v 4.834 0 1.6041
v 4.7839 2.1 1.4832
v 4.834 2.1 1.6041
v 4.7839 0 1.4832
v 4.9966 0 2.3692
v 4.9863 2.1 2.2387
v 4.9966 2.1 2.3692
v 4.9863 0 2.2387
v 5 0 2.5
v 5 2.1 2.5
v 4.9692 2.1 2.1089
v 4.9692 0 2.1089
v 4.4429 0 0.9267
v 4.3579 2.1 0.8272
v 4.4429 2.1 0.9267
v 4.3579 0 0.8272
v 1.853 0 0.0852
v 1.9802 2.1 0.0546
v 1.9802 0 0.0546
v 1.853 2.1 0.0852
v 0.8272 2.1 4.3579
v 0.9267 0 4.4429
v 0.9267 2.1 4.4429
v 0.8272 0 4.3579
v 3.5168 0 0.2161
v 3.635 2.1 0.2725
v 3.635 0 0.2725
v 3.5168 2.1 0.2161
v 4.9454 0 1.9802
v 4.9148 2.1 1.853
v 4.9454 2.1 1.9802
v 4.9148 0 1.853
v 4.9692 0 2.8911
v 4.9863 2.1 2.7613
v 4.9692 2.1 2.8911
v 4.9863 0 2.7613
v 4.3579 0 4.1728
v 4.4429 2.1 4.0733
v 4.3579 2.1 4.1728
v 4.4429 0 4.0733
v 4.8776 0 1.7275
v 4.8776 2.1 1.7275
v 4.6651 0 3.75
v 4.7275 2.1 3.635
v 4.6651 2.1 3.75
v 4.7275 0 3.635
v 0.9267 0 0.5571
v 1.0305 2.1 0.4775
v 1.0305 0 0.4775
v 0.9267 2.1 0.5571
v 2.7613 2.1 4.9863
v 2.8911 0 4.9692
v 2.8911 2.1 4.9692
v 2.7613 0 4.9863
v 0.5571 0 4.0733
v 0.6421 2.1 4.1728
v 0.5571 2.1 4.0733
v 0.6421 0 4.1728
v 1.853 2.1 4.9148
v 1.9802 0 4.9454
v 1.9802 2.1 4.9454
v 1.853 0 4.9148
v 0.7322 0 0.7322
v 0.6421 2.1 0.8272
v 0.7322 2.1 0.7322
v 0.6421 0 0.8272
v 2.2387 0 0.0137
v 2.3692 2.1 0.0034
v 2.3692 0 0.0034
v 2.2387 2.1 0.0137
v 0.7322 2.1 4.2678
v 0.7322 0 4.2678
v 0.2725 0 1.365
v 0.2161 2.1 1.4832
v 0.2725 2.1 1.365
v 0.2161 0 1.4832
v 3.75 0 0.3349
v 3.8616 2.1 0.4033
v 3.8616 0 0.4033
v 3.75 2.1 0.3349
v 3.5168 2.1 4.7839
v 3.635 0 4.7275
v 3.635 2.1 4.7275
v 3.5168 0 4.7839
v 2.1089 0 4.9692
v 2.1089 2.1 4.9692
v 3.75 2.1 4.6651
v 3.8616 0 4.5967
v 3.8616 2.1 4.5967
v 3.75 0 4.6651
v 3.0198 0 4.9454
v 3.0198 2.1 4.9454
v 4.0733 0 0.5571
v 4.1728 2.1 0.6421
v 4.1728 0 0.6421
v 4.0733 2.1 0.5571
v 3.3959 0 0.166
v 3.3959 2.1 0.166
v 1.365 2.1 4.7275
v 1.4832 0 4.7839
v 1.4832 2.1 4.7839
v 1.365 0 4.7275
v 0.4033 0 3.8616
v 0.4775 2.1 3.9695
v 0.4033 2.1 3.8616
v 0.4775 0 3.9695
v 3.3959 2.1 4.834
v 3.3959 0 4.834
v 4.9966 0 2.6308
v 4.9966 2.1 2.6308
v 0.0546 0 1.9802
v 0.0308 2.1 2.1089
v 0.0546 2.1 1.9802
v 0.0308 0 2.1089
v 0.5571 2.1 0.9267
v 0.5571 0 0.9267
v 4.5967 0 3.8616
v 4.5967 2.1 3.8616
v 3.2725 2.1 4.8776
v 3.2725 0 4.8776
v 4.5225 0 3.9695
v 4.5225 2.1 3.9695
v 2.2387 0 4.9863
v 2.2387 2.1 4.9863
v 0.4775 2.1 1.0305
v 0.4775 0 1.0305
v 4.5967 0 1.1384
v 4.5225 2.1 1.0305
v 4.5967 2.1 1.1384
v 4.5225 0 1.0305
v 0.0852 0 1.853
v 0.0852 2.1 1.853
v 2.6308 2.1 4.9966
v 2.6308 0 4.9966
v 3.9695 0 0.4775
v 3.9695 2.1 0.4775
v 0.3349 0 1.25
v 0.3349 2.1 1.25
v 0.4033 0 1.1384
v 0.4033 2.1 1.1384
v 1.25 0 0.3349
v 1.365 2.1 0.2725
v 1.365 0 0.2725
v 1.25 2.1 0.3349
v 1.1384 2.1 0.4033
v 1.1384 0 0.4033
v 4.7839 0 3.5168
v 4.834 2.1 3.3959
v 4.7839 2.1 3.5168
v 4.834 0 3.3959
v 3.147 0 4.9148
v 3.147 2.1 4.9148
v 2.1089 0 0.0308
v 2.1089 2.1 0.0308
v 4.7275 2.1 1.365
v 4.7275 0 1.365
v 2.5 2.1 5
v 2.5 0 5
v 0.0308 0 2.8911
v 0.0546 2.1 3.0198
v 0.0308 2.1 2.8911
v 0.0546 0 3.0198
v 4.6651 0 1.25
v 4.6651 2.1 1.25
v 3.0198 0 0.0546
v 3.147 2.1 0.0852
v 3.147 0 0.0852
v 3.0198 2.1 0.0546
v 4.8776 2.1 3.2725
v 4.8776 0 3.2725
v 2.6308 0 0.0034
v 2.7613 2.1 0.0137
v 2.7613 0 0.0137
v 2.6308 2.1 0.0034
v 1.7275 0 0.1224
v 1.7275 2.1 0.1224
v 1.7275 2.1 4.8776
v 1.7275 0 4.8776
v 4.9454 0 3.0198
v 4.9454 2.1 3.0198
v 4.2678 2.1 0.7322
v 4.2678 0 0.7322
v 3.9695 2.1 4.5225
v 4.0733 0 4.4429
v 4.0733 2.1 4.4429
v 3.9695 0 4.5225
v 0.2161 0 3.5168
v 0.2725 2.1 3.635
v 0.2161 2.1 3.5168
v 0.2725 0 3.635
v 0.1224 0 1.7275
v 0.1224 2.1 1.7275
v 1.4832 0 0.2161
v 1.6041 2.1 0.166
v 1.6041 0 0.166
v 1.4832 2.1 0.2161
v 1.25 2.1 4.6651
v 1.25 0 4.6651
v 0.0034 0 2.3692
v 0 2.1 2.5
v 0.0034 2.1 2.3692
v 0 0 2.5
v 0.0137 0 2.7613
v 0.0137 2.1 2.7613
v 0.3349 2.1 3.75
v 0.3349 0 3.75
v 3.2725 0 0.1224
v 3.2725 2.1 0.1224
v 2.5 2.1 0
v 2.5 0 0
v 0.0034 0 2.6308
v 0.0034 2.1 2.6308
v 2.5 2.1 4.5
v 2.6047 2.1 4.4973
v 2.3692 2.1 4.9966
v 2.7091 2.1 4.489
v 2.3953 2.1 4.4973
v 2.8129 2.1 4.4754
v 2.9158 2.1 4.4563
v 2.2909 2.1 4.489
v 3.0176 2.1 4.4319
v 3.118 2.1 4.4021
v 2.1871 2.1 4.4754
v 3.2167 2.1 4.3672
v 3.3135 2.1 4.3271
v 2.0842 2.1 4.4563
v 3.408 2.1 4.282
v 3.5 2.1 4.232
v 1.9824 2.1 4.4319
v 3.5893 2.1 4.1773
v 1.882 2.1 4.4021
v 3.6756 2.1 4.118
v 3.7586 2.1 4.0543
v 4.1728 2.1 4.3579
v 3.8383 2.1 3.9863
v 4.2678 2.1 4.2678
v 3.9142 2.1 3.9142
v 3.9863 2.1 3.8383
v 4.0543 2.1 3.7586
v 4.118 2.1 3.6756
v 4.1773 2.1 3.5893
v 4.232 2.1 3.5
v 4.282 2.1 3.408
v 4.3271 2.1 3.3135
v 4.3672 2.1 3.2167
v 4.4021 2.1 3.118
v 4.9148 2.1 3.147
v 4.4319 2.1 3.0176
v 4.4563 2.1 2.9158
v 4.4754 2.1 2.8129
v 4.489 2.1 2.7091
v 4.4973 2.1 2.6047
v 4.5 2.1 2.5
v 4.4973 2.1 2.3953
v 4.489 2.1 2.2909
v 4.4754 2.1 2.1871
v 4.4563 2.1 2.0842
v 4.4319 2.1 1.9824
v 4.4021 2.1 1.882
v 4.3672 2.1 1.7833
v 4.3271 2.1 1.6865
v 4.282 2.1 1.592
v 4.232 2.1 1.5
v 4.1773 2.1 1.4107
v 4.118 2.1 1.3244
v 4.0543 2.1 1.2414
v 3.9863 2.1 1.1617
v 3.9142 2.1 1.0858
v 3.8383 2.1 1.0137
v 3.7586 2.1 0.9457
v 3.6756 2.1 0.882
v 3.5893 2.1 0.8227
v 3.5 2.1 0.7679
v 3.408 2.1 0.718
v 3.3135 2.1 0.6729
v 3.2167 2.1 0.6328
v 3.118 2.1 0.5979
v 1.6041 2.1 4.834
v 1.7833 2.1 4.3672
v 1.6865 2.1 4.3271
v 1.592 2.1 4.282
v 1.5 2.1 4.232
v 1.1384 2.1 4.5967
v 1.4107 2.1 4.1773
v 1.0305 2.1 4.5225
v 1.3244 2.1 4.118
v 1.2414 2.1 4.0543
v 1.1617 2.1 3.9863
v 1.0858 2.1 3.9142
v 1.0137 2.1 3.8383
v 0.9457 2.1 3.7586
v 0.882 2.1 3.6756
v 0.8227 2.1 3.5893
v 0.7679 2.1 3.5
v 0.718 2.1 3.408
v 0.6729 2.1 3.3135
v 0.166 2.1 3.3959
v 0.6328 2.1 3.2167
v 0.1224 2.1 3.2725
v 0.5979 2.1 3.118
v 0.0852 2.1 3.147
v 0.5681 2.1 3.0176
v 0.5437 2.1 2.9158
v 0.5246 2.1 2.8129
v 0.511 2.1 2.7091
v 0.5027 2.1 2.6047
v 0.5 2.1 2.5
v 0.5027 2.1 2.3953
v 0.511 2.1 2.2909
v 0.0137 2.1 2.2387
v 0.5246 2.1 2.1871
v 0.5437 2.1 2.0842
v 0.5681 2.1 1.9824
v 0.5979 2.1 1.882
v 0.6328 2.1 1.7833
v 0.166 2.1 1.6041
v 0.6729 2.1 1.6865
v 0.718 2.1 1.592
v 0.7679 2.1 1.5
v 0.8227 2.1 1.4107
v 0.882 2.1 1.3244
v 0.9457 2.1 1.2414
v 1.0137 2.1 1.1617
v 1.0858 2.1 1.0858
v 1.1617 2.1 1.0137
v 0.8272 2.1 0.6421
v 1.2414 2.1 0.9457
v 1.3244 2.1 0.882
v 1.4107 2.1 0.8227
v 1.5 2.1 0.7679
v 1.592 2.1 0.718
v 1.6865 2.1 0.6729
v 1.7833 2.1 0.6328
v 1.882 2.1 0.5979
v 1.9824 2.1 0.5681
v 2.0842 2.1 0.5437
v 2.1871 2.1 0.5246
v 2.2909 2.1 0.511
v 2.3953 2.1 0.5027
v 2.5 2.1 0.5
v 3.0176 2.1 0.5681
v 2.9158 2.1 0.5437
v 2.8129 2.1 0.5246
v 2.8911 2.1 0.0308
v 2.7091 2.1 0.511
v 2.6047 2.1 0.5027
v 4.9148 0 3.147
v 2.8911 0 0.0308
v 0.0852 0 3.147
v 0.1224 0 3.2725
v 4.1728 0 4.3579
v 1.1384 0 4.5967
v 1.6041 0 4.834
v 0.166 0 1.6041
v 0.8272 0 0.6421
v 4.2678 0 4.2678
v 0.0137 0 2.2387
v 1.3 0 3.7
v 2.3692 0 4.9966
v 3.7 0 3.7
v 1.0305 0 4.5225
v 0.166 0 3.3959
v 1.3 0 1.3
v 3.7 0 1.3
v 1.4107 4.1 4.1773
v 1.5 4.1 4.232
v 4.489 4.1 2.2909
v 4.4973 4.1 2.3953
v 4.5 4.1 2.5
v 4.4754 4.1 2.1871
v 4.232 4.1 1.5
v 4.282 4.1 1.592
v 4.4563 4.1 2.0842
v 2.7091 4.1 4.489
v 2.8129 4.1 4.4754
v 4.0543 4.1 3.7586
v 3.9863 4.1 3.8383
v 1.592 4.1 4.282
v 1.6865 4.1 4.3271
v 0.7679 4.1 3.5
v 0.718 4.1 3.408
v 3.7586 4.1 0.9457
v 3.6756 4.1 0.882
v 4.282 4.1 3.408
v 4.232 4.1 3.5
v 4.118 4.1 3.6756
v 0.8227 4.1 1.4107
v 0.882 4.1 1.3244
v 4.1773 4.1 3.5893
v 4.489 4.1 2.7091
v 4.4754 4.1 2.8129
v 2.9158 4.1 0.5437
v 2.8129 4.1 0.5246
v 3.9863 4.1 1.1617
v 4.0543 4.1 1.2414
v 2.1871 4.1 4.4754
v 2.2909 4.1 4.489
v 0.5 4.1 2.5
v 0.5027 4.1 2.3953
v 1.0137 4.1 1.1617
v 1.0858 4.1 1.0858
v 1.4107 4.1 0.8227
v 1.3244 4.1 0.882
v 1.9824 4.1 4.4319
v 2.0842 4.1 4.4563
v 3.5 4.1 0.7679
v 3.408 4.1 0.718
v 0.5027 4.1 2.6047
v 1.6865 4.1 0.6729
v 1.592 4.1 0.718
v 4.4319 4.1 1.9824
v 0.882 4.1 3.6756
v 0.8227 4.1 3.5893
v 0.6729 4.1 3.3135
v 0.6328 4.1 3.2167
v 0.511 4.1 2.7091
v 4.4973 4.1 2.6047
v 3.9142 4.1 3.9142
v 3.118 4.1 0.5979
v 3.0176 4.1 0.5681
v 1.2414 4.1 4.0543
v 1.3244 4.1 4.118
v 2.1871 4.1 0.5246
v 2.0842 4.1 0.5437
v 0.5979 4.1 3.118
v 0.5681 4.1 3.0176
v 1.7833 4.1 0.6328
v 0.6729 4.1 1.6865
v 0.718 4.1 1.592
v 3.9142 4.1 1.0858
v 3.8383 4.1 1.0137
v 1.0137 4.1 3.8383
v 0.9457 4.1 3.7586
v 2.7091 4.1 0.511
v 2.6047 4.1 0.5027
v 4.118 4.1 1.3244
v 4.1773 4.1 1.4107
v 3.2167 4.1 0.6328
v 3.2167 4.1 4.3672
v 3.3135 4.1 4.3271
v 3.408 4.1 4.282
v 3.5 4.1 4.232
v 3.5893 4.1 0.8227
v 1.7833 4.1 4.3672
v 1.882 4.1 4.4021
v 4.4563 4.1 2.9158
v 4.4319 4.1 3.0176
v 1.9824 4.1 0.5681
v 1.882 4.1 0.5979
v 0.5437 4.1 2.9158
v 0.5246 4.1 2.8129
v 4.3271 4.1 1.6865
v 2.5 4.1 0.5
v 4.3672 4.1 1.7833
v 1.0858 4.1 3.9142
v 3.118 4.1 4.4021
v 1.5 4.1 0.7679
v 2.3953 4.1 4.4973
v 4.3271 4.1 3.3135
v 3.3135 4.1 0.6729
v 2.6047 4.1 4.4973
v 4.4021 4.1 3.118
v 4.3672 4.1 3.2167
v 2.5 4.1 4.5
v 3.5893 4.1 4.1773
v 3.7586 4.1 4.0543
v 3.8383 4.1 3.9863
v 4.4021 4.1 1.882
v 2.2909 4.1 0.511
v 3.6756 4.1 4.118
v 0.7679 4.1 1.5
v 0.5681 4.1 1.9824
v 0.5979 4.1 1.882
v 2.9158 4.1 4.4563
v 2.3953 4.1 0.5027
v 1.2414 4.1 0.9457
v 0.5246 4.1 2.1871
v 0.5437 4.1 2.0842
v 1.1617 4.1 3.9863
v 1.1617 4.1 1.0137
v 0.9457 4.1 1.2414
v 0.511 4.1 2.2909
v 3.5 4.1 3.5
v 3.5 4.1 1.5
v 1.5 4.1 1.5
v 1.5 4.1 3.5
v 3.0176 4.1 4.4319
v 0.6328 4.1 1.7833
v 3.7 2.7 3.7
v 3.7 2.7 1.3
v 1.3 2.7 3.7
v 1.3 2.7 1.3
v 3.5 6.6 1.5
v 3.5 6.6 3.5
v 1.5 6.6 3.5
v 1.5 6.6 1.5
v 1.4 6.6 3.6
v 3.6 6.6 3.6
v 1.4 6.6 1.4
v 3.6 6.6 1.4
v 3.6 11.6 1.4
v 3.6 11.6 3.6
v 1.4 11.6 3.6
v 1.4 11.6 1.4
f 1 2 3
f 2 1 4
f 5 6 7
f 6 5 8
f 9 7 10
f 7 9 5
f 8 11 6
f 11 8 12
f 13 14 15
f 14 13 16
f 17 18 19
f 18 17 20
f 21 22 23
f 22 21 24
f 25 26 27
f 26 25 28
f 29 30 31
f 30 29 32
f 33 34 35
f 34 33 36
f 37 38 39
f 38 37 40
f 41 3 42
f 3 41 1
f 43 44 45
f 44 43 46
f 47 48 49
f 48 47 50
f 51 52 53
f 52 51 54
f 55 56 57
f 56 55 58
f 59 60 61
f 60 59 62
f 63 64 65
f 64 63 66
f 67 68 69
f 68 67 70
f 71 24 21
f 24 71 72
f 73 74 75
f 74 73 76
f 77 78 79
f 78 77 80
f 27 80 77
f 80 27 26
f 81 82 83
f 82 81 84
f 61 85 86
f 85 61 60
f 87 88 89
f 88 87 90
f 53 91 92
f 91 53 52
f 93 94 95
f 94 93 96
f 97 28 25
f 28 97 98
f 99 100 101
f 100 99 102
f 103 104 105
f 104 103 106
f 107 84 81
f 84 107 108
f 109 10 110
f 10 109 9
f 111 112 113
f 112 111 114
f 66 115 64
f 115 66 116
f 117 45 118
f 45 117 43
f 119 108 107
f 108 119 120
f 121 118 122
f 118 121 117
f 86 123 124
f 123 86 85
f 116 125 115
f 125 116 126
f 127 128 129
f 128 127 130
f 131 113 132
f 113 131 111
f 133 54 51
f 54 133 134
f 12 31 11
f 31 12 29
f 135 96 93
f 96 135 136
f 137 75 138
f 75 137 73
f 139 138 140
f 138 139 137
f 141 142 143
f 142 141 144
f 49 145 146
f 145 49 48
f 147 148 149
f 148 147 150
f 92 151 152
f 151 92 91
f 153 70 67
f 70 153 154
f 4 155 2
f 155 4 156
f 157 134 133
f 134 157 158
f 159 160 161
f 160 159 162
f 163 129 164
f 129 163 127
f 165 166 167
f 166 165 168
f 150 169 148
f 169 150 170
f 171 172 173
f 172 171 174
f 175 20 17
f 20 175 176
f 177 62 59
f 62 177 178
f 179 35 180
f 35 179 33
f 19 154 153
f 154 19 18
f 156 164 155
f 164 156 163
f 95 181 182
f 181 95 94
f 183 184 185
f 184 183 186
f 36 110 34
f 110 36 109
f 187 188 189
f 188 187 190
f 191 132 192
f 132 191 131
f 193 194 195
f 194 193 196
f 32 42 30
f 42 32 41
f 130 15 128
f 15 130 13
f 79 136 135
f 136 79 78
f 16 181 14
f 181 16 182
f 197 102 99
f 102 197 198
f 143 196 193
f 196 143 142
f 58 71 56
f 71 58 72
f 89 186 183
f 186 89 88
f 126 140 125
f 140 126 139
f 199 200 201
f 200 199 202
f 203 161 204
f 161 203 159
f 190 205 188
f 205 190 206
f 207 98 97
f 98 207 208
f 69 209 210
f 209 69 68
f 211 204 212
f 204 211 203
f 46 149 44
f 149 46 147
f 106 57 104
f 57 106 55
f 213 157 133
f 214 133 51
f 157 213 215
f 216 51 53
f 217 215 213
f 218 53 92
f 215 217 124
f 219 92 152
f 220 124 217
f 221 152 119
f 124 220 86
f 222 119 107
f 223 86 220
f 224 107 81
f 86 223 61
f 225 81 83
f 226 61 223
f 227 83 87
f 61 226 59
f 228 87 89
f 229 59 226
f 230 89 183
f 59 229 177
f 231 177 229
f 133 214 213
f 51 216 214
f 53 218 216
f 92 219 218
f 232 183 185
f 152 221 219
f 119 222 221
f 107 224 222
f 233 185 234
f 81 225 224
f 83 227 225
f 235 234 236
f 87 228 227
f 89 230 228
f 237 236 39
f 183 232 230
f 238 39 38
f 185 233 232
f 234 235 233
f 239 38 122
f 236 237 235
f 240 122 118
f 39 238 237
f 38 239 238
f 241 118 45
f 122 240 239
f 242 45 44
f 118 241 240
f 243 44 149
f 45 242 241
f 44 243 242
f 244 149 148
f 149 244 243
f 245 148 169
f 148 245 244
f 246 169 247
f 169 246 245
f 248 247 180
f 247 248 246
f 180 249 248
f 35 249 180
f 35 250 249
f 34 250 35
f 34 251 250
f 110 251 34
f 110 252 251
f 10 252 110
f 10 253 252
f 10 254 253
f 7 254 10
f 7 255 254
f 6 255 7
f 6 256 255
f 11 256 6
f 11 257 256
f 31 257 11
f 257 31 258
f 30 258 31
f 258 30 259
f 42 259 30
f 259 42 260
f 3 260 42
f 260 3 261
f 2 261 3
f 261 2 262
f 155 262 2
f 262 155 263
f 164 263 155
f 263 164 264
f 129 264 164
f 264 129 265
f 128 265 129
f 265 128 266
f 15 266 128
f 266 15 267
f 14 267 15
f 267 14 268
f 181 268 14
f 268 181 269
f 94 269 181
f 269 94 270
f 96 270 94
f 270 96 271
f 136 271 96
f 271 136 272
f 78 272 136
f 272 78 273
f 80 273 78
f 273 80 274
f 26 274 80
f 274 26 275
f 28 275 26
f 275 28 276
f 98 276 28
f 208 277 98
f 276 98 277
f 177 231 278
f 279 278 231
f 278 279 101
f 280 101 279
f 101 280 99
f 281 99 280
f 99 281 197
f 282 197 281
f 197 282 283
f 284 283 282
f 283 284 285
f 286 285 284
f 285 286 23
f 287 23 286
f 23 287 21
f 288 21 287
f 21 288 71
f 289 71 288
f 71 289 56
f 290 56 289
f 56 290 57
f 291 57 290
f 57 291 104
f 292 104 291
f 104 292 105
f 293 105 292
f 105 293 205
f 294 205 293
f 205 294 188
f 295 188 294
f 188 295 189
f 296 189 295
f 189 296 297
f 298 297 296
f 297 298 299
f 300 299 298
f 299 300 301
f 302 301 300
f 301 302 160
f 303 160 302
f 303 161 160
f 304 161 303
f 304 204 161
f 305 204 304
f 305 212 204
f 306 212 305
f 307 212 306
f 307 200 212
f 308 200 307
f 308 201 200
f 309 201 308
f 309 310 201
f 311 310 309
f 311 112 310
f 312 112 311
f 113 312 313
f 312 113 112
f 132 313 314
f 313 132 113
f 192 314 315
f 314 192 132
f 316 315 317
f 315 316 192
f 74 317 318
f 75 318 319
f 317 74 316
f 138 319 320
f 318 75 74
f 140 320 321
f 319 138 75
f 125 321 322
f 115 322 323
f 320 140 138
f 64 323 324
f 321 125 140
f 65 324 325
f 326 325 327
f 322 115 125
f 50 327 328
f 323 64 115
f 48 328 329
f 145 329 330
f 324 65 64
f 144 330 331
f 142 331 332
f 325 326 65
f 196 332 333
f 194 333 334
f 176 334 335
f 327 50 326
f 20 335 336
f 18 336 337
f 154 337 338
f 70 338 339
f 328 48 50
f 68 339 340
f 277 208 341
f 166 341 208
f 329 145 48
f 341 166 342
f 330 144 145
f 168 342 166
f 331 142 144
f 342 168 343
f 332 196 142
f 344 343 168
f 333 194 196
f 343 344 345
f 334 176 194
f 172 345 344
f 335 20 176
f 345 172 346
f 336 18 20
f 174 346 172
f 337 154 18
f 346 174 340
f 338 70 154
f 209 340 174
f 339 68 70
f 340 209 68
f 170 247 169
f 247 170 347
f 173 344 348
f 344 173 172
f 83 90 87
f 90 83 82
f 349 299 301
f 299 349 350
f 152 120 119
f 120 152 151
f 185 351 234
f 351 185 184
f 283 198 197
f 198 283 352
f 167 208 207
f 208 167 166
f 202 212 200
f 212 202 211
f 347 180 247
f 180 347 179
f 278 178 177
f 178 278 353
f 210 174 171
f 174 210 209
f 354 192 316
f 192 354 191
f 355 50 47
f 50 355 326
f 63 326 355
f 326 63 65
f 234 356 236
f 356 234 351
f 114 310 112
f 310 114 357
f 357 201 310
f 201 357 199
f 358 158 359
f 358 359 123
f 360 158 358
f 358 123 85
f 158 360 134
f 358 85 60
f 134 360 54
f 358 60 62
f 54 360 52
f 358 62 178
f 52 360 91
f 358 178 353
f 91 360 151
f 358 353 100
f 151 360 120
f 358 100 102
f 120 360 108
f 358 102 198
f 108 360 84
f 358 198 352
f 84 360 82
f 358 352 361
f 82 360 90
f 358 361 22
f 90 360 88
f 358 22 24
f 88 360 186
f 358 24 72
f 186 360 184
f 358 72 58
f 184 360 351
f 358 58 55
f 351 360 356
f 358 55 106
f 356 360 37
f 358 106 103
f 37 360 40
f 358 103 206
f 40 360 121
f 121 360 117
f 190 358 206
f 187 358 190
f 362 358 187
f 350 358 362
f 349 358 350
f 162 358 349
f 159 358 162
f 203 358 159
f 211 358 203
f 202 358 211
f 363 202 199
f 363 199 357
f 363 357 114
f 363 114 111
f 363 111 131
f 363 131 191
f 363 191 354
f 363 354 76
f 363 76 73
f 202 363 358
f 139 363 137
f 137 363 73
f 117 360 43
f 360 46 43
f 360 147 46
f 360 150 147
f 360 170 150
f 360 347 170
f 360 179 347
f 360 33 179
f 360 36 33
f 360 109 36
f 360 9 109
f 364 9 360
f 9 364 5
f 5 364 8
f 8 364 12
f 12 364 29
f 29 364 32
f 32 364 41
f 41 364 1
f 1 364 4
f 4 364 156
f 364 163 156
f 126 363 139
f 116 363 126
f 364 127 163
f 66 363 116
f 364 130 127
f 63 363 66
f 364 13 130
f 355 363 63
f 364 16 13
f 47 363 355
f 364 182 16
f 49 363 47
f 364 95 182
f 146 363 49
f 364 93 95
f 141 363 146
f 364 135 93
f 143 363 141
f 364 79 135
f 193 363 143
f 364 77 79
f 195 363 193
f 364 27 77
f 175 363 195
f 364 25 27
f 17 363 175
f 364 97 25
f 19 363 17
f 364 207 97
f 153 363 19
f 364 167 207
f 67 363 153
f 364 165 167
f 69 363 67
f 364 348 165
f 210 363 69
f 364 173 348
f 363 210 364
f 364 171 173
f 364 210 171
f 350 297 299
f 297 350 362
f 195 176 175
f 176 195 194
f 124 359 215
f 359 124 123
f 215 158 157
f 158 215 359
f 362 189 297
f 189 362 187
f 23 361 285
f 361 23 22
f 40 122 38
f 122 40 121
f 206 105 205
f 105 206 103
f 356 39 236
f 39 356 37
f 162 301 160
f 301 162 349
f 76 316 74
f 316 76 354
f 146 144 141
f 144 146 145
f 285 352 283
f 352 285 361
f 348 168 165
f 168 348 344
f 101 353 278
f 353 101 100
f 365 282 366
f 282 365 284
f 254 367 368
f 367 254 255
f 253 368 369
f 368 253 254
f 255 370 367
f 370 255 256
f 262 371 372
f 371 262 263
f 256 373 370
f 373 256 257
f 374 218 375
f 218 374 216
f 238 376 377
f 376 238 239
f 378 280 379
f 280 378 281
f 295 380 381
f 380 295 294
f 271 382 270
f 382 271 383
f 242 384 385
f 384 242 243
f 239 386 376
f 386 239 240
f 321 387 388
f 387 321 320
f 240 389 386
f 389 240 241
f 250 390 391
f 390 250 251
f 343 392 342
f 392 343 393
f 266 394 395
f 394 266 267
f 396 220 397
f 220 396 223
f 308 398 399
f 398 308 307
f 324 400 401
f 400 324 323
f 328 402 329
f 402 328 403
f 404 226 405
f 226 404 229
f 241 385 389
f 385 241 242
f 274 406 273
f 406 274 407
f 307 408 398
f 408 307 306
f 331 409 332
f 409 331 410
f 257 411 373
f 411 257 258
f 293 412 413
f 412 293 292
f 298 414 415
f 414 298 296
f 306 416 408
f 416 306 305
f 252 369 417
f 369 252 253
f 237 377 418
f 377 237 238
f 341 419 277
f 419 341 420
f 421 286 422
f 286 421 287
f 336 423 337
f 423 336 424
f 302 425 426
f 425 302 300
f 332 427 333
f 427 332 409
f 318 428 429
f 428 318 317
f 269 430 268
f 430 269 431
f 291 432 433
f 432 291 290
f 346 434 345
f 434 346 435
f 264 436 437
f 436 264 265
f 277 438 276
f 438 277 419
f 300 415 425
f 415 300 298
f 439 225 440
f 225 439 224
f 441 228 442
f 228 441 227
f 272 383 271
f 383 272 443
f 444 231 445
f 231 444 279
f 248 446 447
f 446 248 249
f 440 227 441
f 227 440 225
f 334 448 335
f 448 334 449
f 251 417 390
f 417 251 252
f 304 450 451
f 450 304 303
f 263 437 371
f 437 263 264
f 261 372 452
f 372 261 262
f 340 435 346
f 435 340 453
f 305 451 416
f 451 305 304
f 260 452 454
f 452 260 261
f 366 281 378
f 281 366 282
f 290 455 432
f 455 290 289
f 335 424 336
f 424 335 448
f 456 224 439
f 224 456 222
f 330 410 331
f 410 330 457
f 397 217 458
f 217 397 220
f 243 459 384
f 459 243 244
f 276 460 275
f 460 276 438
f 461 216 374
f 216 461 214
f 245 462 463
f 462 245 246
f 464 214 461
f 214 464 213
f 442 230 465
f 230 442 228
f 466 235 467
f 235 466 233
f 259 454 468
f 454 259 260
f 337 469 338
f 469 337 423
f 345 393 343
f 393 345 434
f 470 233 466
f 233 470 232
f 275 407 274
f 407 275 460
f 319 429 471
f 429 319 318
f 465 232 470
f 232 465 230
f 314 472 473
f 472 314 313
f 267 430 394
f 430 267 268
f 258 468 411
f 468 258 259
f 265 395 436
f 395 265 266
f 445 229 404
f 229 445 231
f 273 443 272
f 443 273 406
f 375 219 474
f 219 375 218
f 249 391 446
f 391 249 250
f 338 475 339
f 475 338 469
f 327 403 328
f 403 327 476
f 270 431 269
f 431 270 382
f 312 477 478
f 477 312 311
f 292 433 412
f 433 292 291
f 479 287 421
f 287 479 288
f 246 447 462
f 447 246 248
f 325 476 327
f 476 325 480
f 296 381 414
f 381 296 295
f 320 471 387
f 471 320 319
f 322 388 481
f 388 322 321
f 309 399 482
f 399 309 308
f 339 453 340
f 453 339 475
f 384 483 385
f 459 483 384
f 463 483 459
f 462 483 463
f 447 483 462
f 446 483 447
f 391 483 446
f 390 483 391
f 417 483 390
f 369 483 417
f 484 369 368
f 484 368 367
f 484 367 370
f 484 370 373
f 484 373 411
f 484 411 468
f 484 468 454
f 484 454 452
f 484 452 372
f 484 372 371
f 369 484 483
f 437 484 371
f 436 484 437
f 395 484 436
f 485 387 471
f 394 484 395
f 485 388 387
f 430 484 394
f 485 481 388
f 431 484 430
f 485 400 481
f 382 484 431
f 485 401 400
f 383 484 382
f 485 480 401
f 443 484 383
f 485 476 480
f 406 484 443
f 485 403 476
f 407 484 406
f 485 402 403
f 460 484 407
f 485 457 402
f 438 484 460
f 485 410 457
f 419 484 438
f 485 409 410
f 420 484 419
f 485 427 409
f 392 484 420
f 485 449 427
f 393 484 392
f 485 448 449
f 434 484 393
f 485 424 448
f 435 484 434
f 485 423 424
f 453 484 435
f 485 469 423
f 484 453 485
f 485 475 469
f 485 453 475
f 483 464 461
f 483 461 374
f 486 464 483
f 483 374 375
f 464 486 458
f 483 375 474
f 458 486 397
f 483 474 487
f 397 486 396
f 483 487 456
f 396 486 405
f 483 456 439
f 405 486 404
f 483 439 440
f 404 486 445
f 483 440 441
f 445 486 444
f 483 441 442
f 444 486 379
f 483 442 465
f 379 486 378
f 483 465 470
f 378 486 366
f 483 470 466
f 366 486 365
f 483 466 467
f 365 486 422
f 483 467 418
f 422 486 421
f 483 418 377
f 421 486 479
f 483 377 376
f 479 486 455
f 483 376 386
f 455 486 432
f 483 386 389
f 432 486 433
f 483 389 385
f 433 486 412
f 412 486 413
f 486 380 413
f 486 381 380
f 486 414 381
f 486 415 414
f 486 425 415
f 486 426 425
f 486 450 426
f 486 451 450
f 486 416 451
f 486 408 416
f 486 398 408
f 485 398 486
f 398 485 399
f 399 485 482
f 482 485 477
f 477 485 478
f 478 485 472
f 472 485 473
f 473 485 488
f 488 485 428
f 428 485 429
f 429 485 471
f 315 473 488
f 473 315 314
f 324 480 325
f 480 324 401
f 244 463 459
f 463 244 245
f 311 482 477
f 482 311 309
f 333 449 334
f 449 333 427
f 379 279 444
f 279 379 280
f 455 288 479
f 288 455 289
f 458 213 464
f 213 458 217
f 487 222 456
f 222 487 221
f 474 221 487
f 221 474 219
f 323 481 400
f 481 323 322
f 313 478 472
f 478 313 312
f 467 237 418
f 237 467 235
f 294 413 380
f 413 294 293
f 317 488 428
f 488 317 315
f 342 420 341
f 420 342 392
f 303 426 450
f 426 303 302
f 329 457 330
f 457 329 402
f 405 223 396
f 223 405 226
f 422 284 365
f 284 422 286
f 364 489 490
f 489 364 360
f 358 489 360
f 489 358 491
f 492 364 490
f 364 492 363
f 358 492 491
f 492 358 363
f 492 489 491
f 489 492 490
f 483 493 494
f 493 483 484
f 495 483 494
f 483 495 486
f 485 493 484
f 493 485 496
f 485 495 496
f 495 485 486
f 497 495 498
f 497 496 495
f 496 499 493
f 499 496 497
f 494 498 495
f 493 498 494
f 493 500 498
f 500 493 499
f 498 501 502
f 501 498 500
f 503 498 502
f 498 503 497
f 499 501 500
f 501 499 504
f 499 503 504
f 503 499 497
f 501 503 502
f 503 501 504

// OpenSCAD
// file: shared/measurements.scad
/*
 * Keyboard Measurements
 */

pcb_thickness = 1.6;

// The plastic used to cover the TP mount's metal part to make
// sure it doesn't short the switch pins.
tp_isolator_thickness = 0.4;




/*
 * Kailh Choc Switch Measurements
 * http://www.kailh.com/uploads/allimg/171208/2-1G20Q0432C29.png
 */

// The width of the choc switch where it touches the bottom plate
choc_width_bottom = 13.6;

// The width of the choc switch with the notch that sits above the top plate
choc_width_notch = 15.0;

// How much the notch adds in width on each side
// (0.7mm)
choc_notch_width = (choc_width_notch - choc_width_bottom) / 2;

// The space from the pcb until the choc switch notch
choc_notch_to_pcb_z_space = 2.2;

// Total x distance between switch center points (choc x spacing)
choc_spacing_x = 18;

// The space between two switches at the bottom plate
// (4.4mm)
choc_switches_space_between_bottom = choc_spacing_x - choc_width_bottom;

// The space between two switches at the top with the little notch
// (3mm)
choc_switches_space_between_top = choc_spacing_x - choc_width_notch;
// file: trackpoint_extension.scad
include <shared/measurements.scad>

// Overlap Buffer for cutting
ovb = 0.01;

module draw_trackpoint_extension(
        // The height from the pcb to where you want the cap to end
        desired_cap_height,

        // How far below the pcb the TP is mounted (from start of the stem)
        tp_mounting_distance,

        // The measured width and height of the TP stem
        tp_stem_width,
        tp_stem_height,

        // The red cap dimensions
        tp_cap_height_total,
        tp_cap_hole_height,
        tp_cap_hole_width,

        // By how much you want to increase the adapter hole compared to the
        // actual TP stem width
        adapter_hole_incr=0.2,

        // The width of the adapter around the TP stem
        adapter_width_below_pcb=5.0,
        adapter_width_above_pcb=4.0,

        // By how much you want to increase the tip for a tighter cap fit
        tip_width_incr=0,

        // The thickness of the PCB
        pcb_height=1.6) {

    adapter_radius_below_pcb = adapter_width_below_pcb / 2;
    adapter_radius_above_pcb = adapter_width_above_pcb / 2;
    adapter_height = (
        tp_mounting_distance + pcb_height + choc_notch_to_pcb_z_space - 0.2
    );

    adapter_hole_width = tp_stem_width + adapter_hole_incr;
    adapter_hole_height = tp_stem_height + adapter_hole_incr;
    adapter_hole_offset = adapter_radius_below_pcb - adapter_hole_width / 2;

    adapter_hole_corner_distance = (
        sqrt(
            adapter_hole_width * adapter_hole_width +
            adapter_hole_width * adapter_hole_width
        ) / 2
    );
    adapter_wall_thickness_below_pcb = (
        adapter_radius_below_pcb - adapter_hole_corner_distance
    );
    adapter_wall_thickness_above_pcb = (
        adapter_radius_above_pcb - adapter_hole_corner_distance
    );
    adapter_wall_thickness_top = adapter_height - adapter_hole_height;

    // Since a portion of the extension adapter will be below the top of the
    // pcb, we calculate the length that it will extend above the pcb here
    adapter_height_below_pcb = pcb_height + tp_mounting_distance;
    adapter_height_above_pcb = adapter_height - adapter_height_below_pcb;

    tip_width = tp_cap_hole_width + tip_width_incr;
    tip_height = tp_cap_hole_height;
    tip_offset = adapter_radius_below_pcb - tip_width / 2;

    // The height added on top of the stem extension. Needed for the total TP
    // extension height
    tp_cap_top_height = tp_cap_height_total - tp_cap_hole_height;

    // Height of the part between the mount at the bottom and tip at the top
    extension_height = (
        desired_cap_height - tp_cap_top_height - tip_height
        - adapter_height_above_pcb
    );

    extension_width = 2;
    extension_offset = adapter_radius_below_pcb - extension_width / 2;

    total_height = adapter_height + extension_height + tip_height;
    above_pcb_height = total_height - adapter_height_below_pcb;
    above_pcb_height_cap = above_pcb_height + tp_cap_top_height;

    center = [false, false, false];

    echo(str("Building TP extension..."));
    echo(str("\t Total height: ", total_height, "mm"));
    echo(str("\t Below PCB height: ", adapter_height_below_pcb, "mm"));
    echo(str("\t Above PCB height: ", above_pcb_height, "mm"));
    echo(str("\t Above PCB height with cap: ", above_pcb_height_cap, "mm"));
    echo(str("\t Adapter height: ", adapter_height, "mm"));
    echo(str("\t Adapter width below pcb: ", adapter_width_below_pcb, "mm"));
    echo(str("\t Adapter width above pcb: ", adapter_width_above_pcb, "mm"));
    echo(str("\t Adapter hole height: ", adapter_hole_height, "mm (+", adapter_hole_height - tp_stem_height, "mm)"));
    echo(str("\t Adapter hole width: ", adapter_hole_width, "mm (+", adapter_hole_width - tp_stem_width, "mm)"));
    echo(str("\t Adapter wall thickness below pcb: ", adapter_wall_thickness_below_pcb, "mm"));
    echo(str("\t Adapter wall thickness above pcb: ", adapter_wall_thickness_above_pcb, "mm"));
    echo(str("\t Adapter wall thickness top: ", adapter_wall_thickness_top, "mm"));

    difference() {

        union() {
            // Adapter below pcb
            translate([adapter_radius_below_pcb, 0, adapter_radius_below_pcb])
            rotate([-90, 0, 0])
                cylinder(
                    $fn=120,
                    h=adapter_height_below_pcb,
                    r=adapter_radius_below_pcb
                );

            // Adapter above pcb
            translate([
                adapter_radius_below_pcb,
                adapter_height_below_pcb,
                adapter_radius_below_pcb
            ])
            rotate([-90, 0, 0])
                cylinder(
                    $fn=120,
                    h=adapter_height_above_pcb,
                    r=adapter_radius_above_pcb
                );
        }

        // Hole
        translate([adapter_hole_offset, -ovb, adapter_hole_offset])
            cube([
                adapter_hole_width,
                adapter_hole_height + ovb,
                adapter_hole_width
            ]);
    };

    // Top extension
    translate([+extension_offset, +adapter_height, +extension_offset])
        cube(
            [extension_width, extension_height, extension_width]
        );

    // Tip for red cap
    translate([+tip_offset, +adapter_height + extension_height, +tip_offset])
        cube([tip_width, tip_height, tip_width]);
}
// main file
use <trackpoint_extension.scad>

/*
 * Parameters
 */

// The height above the pcb where you want the top of the red cap to be
desired_cap_height_default = 10.5;

// By how much you want to increase the adapter hole compared to the
// actual TP stem width
adapter_hole_incr_default = 0.2;

// How wide the adapter should be below and above the pcb.
// Pay attention to the adapter wall thickness calculations in the logs to
// ensure it is thick enough to withstand the pressure of the TP.
//
// You also need to consider the size of your TP hole, as well as how much your
// switches are going to portrude into the hole.
adapter_width_below_pcb_default = 5;
adapter_width_above_pcb_default = 4;

// Thickness of the pcb
pcb_height_default = 1.6;

// How far the TP is mounted BELOW the PCB.
// This should include the thickness of any plastic or electrical tape you use
// to isolate the TP mount.
// This TP is super large, so it will be at least 0.5mm below the pcb
tp_mounting_distance_default = 0.5;

// By how much you want to increase the tip for a tighter cap fit
tip_width_incr_default = 0;


/*
 * TP Measurements
 */

// From bottom metal part to stem top
tp_total_height = 5.0;

// The metal and black bottom part.
// This is the height that sticks out below the pcb if the
// TP is mounted totally flush.
tp_board_thickness = 2.5;

// The height of the white stem
// (2.5mm)
tp_stem_height = tp_total_height - tp_board_thickness;

// TP white stem dimensions
tp_stem_width = 2.2;
tp_stem_diameter = 3.0;

// TP dot dimensions
tp_cap_height_total = 6.0;
tp_cap_hole_height = 5.0;
tp_cap_hole_width = tp_stem_width;


module draw_tp_ext_green_t430(
        desired_cap_height=desired_cap_height_default,
        tp_mounting_distance=tp_mounting_distance_default,
        adapter_hole_incr=adapter_hole_incr_default,
        adapter_width_below_pcb=adapter_width_below_pcb_default,
        adapter_width_above_pcb=adapter_width_above_pcb_default,
        tip_width_incr=tip_width_incr_default,
        pcb_height=pcb_height_default) {

    draw_trackpoint_extension(
        desired_cap_height=desired_cap_height,

        // How far below the pcb the TP is mounted (from start of the stem)
        tp_mounting_distance=tp_mounting_distance,

        // The measured width and height of the TP stem
        tp_stem_width=tp_stem_width,
        tp_stem_height=tp_stem_height,

        // The red cap dimensions
        tp_cap_height_total=tp_cap_height_total,
        tp_cap_hole_height=tp_cap_hole_height,
        tp_cap_hole_width=tp_cap_hole_width,

        // By how much you want to increase the adapter hole compared to the
        // actual TP stem width
        adapter_hole_incr=adapter_hole_incr,

        // The width of the adapter around the TP stem
        adapter_width_below_pcb=adapter_width_below_pcb,
        adapter_width_above_pcb=adapter_width_above_pcb,

        // By how much you want to increase the tip for a tighter cap fit
        tip_width_incr=tip_width_incr,

        // The thickness of the PCB
        pcb_height=pcb_height
    );
}

draw_tp_ext_green_t430();
